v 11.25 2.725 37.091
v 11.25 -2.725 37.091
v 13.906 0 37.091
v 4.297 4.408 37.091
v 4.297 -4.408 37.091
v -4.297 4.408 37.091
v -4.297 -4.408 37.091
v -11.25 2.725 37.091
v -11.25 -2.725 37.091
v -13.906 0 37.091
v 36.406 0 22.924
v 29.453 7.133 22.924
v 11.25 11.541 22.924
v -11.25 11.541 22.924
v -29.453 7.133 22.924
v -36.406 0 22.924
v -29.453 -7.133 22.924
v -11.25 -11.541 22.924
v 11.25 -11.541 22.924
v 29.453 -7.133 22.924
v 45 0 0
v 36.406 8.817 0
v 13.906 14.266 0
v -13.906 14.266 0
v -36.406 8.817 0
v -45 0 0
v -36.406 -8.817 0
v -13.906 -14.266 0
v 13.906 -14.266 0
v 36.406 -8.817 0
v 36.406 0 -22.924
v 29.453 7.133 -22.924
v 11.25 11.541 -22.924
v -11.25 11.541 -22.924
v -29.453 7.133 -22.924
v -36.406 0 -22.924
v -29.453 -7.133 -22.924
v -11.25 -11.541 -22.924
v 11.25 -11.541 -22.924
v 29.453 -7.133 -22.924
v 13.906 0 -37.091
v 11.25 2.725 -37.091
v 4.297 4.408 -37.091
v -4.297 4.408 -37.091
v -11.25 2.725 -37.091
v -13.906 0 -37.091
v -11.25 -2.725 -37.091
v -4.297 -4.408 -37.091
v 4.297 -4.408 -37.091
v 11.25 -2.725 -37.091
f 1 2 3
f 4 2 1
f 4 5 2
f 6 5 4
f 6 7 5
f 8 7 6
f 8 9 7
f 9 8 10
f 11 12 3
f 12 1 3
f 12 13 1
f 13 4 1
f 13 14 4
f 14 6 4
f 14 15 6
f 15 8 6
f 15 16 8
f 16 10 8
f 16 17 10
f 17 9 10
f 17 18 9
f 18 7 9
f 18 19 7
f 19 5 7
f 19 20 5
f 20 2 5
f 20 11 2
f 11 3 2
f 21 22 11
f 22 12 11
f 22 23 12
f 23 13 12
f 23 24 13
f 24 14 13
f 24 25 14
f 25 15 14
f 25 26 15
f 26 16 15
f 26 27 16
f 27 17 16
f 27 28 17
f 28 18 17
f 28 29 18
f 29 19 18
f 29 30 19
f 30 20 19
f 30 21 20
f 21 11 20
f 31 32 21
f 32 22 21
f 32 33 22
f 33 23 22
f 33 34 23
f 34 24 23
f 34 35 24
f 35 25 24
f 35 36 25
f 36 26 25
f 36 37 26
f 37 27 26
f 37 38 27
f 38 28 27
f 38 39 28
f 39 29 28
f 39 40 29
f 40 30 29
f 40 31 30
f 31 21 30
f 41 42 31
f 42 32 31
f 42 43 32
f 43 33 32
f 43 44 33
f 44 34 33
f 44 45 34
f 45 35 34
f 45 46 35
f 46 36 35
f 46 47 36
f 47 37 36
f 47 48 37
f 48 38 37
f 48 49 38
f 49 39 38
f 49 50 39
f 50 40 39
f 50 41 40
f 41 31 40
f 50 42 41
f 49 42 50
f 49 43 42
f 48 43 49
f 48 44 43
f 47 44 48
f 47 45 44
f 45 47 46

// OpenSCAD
// Generated by SolidPython 1.0.1 on 2020-07-29 00:46:51


scale(v = [15, 5, 13]) {
	sphere(r = 3);
}
/***********************************************
*********      SolidPython code:      **********
************************************************
 
# import packages: SolidPython
from solid import *
from solid.utils import *
from itertools import chain, combinations, permutations


class Resize:

    def __init__(self, scad_file):
        self.scad_file = scad_file
        #self.scad_file = import_scad(scad_file)
        # cone/cylinder param:
        self.r1 = 0
        self.r2 = 0
        self.h = 0
        # rectangular prism param:
        self.w = 0
        self.l = 0
        # ellipse param:
        self.r = 0

    # import OpenScad code (file name corresponds to shape)


    # classify shape + parameters
    def assign(self, param1, param2, param3):
        if self.scad_file == 'cone.scad':
            self.r1 = param1
            self.r2 = param2
            self.h = param3
        elif self.scad_file == 'cylinder.scad':
            self.r1 = param1
            self.r2 = param2
            self.h = param3
        elif self.scad_file == 'rectangularPrism.scad':
            self.h = param1
            self.l = param2
            self.w = param3
        else:
            self.r = param1
            self.h = param2

    # resize parameters
    def iterate(self):
        x = range(3, 20, 2)
        i = 1
        if self.scad_file == 'cone.scad':
            tempList = list(permutations(x, 2))
            for temp in tempList:
                param1 = temp[0]
                param2 = temp[1]
                filepath = 'produced_scad_files/' + 'cone' + str(param1) + '_' + str(param2) + '_' + '.scad'
                scad_render_to_file(cylinder(h=param1, r1=param2, r2=0), filepath)

        elif self.scad_file == 'cylinder.scad':
            tempList = list(permutations(x, 3))
            for temp in tempList:
                param1 = temp[0]
                param2 = temp[1]
                filepath = 'produced_scad_files/' + 'cylinder' + str(param1) + '_' + str(param2) + '_' + '.scad'
                scad_render_to_file(cylinder(h=param1, r1=param2, r2=param2), filepath)

        elif self.scad_file == 'rectangularPrism.scad':
            tempList = list(permutations(x, 3))
            for temp in tempList:
                param1 = temp[0]
                param2 = temp[1]
                param3 = temp[2]
                filepath = 'produced_scad_files/' + 'rectangularPrism' + str(param1) + '_' + str(param2) + '_' + str(
                    param3) + '.scad'
                scad_render_to_file(cube(size=(param1, param2, param3)), filepath)

        elif self.scad_file == 'ellipse.scad':
            tempList = list(permutations(x, 4))
            for temp in tempList:
                param1 = temp[0]
                param2 = temp[1]
                param3 = temp[2]
                param4 = temp[3]
                filepath = 'produced_scad_files/' + 'ellipse' + str(param1) + '_' + str(param2) + '_' + str(param3) + '_' + str(param4) + '.scad'
                scad_render_to_file(scale([param1, param2, param3])(sphere(r=param4)), filepath)

    def render_to_scadfile(self):
        scad_render_to_file(scad, 'example.scad') 
 
************************************************/
